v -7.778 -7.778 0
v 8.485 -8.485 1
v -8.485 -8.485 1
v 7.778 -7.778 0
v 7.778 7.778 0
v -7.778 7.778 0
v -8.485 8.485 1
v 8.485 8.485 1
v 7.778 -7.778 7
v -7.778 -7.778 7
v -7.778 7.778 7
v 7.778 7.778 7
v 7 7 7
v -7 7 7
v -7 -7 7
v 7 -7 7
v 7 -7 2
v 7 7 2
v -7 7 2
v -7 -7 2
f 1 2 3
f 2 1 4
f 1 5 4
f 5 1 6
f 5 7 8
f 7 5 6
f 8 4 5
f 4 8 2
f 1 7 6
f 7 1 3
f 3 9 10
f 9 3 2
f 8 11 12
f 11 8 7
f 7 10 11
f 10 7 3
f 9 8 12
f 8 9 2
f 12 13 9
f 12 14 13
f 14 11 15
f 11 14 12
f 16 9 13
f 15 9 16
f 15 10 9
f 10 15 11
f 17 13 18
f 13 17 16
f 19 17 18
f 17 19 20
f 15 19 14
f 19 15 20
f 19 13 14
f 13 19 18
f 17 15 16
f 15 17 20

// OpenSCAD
difference() {
  rotate([0,0,45]) {
    cylinder(d2=24,d1=22,h=1,$fn=4);
    translate([0,0,1]) cylinder(d1=24,d2=22,h=6,$fn=4);
  }
  translate([-7,-7,2]) cube(14);
}
